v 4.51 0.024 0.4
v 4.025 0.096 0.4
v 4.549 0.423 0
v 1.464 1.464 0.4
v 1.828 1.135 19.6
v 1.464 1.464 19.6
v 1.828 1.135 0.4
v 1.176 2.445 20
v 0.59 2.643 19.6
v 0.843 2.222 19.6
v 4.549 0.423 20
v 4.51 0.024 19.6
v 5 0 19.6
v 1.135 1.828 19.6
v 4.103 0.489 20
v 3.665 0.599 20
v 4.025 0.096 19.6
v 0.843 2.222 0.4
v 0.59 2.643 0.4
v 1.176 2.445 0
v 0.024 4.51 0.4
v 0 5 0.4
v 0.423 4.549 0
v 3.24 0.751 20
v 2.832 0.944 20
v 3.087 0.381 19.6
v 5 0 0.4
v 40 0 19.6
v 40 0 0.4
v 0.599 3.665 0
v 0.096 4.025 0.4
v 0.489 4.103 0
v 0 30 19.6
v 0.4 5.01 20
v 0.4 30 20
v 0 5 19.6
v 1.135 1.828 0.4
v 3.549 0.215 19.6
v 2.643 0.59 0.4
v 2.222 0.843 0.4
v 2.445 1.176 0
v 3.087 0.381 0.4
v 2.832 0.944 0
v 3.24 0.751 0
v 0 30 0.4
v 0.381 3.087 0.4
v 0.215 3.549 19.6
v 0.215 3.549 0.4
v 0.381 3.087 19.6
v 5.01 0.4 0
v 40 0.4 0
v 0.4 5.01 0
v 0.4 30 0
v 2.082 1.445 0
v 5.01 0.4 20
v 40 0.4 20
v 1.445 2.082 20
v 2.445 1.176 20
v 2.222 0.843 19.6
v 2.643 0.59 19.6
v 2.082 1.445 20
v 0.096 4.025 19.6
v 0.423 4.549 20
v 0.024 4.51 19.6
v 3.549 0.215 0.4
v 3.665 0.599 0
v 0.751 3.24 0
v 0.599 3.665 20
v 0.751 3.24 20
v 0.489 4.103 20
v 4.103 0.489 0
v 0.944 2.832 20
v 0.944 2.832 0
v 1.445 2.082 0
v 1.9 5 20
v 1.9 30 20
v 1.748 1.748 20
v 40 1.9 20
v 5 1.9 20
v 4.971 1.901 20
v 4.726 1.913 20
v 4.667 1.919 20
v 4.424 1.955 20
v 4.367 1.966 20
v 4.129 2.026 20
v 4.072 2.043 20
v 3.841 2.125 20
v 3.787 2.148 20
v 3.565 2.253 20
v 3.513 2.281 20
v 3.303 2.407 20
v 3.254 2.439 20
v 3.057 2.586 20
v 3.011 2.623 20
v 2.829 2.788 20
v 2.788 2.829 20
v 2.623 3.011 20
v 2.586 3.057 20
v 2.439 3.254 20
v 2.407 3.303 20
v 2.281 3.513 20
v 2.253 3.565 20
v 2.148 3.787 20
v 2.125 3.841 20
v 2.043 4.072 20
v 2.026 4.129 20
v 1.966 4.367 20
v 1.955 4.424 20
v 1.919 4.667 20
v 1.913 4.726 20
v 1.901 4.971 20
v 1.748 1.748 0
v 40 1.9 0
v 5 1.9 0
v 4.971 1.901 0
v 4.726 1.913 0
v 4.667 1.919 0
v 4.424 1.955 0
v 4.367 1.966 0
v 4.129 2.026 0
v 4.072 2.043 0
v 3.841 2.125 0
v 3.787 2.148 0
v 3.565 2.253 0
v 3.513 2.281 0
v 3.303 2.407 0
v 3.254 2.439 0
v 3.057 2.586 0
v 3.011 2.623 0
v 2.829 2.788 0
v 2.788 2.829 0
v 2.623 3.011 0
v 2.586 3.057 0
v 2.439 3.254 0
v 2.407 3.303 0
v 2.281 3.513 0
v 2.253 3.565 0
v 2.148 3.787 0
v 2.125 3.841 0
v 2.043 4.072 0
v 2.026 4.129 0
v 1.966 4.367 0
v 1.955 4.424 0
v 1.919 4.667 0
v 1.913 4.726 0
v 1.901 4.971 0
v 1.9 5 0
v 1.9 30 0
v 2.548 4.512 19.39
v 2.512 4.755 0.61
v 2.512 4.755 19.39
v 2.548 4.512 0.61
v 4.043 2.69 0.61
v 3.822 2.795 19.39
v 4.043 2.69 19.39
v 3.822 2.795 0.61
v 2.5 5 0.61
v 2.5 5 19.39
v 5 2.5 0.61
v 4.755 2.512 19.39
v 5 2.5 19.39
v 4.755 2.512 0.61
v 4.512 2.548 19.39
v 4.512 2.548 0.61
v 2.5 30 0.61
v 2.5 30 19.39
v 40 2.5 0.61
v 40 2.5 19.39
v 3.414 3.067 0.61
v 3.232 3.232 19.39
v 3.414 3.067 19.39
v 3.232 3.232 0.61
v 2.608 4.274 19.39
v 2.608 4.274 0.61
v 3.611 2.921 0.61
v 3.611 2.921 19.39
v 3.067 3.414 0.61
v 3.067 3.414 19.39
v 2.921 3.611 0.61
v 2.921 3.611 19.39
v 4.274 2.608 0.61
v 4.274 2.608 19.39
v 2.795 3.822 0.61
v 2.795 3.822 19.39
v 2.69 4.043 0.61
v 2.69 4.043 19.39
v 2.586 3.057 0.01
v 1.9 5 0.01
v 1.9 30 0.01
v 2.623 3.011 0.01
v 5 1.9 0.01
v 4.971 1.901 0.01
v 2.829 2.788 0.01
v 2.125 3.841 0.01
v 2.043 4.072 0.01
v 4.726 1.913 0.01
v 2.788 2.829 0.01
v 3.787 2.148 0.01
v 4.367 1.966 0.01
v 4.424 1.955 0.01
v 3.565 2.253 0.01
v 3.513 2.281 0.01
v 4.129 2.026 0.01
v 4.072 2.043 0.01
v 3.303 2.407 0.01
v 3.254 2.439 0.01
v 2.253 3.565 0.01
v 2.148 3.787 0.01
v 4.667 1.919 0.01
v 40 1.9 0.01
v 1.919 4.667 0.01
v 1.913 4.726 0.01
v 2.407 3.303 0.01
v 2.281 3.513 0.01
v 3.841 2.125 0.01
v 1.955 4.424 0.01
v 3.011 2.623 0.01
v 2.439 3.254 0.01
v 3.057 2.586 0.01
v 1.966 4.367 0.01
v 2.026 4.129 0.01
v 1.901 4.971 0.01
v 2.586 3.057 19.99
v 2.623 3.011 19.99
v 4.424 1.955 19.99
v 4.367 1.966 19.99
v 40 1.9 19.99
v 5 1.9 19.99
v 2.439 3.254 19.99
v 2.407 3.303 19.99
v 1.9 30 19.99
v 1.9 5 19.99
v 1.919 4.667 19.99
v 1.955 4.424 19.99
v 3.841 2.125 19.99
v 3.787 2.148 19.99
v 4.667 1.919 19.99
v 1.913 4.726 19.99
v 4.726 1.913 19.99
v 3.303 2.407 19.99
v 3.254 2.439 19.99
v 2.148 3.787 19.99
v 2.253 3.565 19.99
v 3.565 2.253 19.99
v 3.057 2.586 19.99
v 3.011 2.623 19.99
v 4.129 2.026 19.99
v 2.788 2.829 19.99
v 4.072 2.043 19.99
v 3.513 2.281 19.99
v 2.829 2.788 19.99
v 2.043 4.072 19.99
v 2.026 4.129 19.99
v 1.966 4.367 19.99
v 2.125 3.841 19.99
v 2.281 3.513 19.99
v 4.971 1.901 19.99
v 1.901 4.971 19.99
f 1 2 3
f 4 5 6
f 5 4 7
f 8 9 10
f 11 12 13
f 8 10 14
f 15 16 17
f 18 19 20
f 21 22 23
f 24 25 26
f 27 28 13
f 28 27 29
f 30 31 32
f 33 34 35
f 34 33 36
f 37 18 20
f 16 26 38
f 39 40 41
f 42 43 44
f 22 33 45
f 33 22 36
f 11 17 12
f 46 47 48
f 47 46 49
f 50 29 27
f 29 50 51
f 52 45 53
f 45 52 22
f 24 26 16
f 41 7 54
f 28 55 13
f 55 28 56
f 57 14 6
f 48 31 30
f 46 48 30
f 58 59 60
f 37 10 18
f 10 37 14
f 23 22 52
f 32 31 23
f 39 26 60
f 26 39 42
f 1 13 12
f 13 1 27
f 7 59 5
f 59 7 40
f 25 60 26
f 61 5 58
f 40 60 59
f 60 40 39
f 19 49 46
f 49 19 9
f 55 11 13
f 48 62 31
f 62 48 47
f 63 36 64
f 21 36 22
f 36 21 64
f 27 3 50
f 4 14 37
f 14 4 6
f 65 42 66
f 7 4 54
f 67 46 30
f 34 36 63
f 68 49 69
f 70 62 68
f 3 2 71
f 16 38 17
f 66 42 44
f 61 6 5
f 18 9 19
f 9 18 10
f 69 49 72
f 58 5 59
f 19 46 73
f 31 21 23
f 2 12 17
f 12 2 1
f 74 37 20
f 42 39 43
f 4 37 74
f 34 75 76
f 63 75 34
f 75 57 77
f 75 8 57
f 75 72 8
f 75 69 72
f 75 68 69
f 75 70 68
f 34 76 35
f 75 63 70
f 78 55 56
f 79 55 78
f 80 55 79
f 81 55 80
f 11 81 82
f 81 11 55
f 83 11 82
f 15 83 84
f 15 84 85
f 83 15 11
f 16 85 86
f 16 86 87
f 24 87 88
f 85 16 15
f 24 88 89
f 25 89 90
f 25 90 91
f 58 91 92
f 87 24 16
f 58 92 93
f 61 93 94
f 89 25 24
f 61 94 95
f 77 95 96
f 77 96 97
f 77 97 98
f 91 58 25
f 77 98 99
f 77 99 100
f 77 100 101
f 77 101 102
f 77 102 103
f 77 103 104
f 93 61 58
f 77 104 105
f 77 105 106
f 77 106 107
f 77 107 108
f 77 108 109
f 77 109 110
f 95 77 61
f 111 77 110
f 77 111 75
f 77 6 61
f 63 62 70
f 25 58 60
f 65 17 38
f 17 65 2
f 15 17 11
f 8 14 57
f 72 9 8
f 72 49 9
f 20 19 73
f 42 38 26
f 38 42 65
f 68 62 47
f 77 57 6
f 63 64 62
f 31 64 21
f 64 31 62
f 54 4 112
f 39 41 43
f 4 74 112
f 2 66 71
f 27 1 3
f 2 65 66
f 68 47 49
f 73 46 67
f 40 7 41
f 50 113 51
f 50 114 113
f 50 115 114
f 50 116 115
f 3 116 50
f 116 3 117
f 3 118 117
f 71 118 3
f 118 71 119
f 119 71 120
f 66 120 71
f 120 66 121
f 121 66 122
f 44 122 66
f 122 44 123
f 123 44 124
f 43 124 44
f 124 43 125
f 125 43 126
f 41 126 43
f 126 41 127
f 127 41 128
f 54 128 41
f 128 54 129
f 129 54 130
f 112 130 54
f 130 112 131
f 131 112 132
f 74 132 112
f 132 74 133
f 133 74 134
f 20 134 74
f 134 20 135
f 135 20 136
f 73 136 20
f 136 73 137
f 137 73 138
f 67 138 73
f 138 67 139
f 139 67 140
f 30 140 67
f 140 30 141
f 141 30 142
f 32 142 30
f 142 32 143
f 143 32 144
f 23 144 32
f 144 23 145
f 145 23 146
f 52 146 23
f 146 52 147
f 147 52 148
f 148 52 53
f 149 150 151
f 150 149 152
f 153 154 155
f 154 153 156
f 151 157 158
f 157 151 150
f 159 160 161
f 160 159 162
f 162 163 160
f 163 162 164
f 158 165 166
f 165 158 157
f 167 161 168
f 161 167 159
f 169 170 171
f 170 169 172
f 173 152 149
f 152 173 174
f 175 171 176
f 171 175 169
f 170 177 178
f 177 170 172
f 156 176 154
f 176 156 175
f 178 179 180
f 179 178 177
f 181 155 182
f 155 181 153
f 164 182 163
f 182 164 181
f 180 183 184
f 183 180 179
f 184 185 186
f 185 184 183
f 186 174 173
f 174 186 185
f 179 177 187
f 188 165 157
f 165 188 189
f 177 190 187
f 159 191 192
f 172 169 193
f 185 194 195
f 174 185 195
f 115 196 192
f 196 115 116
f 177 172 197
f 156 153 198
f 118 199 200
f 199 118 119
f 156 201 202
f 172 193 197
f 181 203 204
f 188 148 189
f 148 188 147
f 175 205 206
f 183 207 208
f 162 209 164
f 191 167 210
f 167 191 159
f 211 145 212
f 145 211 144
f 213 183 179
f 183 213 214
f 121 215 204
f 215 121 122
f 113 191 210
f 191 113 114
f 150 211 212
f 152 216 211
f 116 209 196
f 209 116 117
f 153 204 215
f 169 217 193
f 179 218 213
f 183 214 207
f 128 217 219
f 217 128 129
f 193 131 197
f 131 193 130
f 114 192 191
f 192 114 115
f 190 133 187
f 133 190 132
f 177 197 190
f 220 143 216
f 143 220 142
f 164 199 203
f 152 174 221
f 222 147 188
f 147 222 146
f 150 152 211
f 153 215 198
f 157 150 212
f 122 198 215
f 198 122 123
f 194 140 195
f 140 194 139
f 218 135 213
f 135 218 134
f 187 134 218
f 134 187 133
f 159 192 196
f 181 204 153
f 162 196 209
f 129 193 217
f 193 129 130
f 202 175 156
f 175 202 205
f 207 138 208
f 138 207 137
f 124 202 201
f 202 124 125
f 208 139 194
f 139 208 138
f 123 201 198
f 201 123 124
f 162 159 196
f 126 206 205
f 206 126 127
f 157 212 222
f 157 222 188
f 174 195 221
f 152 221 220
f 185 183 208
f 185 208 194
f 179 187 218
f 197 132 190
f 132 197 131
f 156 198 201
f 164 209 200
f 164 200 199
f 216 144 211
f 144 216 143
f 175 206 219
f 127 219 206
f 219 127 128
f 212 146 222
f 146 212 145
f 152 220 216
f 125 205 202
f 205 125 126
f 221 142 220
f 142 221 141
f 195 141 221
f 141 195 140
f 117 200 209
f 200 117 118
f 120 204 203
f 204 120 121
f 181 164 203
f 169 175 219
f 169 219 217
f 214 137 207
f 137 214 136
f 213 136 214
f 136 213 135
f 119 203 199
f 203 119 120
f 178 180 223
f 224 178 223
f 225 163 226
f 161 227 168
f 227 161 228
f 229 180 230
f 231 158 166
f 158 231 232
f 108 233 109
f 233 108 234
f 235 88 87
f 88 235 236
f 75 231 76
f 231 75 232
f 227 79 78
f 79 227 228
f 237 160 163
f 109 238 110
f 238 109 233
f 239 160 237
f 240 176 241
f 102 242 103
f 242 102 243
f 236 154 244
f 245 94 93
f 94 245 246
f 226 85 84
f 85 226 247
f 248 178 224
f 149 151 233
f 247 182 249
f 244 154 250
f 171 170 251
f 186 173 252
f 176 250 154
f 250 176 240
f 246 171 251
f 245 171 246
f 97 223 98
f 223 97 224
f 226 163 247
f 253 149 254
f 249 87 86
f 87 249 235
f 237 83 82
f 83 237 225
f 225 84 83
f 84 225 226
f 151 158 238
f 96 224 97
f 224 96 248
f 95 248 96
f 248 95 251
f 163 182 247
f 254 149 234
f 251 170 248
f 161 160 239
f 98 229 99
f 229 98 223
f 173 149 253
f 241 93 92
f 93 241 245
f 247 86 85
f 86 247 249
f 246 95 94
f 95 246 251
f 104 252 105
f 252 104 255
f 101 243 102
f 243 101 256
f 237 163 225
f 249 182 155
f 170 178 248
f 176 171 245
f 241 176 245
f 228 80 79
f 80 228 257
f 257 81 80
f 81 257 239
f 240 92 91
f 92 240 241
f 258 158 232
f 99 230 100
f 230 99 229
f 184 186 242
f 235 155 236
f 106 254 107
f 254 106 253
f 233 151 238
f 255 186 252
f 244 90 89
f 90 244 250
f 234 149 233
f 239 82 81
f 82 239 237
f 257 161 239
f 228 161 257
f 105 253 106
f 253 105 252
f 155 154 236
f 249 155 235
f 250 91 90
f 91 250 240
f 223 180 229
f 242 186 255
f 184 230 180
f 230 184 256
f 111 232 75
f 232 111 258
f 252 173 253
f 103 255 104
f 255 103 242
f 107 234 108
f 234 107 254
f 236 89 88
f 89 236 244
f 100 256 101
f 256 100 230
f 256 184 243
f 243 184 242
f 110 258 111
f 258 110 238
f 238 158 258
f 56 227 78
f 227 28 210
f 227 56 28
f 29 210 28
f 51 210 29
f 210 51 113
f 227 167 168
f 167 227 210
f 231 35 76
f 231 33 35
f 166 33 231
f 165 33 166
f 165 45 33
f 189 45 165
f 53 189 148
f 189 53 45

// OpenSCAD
//! # Rounded L bracket with end chamfers — v0.1
//!
//! Standalone OpenSCAD example showing an L-shaped shell built from a convex
//! rounded outer profile and a convex rounded inner cutout.
//! Both profiles intentionally extend past the final leg lengths; the ends are
//! trimmed flat only after the chamfers and hollow section have been created.
//!
//! All dimensions are in millimetres.

$fn = 64;

leg_x          = 40;   // leg length along X
leg_y          = 30;   // leg length along Y
height         = 20;   // height along Z
wall_thickness = 2.5;  // wall thickness
outer_radius   = 5;    // outside corner radius
inner_chamfer  = 0.6;  // chamfer on the inside edge
outer_chamfer  = 0.4;  // chamfer on the outside edge

epsilon      = 0.01;
inner_radius = max(outer_radius - wall_thickness, 0.01);

// Both profiles extend 2 mm beyond the final leg ends and are trimmed later.
profile_x = leg_x + 2;
profile_y = leg_y + 2;

// Convex outer profile with one rounded corner at (0, 0).
module outer_2d() {
    hull() {
        translate([outer_radius, outer_radius])
            circle(outer_radius);

        translate([profile_x - epsilon, 0])
            square([epsilon, profile_y]);

        translate([0, profile_y - epsilon])
            square([profile_x, epsilon]);
    }
}

// Convex inner cutout with one rounded corner at
// (wall_thickness, wall_thickness).
module inner_2d() {
    translate([wall_thickness, wall_thickness])
        hull() {
            translate([inner_radius, inner_radius])
                circle(inner_radius);

            translate([profile_x - epsilon, 0])
                square([epsilon, profile_y]);

            translate([0, profile_y - epsilon])
                square([profile_x, epsilon]);
        }
}

// Outer solid with a chamfer at the bottom and top.
module outer_body() {
    hull() {
        linear_extrude(epsilon)
            offset(r = -outer_chamfer)
                outer_2d();

        translate([0, 0, outer_chamfer])
            linear_extrude(height - 2 * outer_chamfer)
                outer_2d();

        translate([0, 0, height - epsilon])
            linear_extrude(epsilon)
                offset(r = -outer_chamfer)
                    outer_2d();
    }
}

// Cutting volume for one inside chamfer.
module inner_chamfer_cut() {
    hull() {
        translate([0, 0, -epsilon])
            linear_extrude(2 * epsilon)
                offset(r = inner_chamfer)
                    inner_2d();

        translate([0, 0, inner_chamfer])
            linear_extrude(epsilon)
                inner_2d();
    }
}

module rounded_l_bracket() {
    intersection() {
        difference() {
            outer_body();

            // Continuous inner cutout.
            translate([0, 0, -1])
                linear_extrude(height + 2)
                    inner_2d();

            // Inside chamfer at the bottom and top.
            inner_chamfer_cut();

            translate([0, 0, height])
                mirror([0, 0, 1])
                    inner_chamfer_cut();
        }

        // Trim the leg ends flat at leg_x and leg_y.
        translate([0, 0, -1])
            cube([leg_x, leg_y, height + 2]);
    }
}

rounded_l_bracket();
